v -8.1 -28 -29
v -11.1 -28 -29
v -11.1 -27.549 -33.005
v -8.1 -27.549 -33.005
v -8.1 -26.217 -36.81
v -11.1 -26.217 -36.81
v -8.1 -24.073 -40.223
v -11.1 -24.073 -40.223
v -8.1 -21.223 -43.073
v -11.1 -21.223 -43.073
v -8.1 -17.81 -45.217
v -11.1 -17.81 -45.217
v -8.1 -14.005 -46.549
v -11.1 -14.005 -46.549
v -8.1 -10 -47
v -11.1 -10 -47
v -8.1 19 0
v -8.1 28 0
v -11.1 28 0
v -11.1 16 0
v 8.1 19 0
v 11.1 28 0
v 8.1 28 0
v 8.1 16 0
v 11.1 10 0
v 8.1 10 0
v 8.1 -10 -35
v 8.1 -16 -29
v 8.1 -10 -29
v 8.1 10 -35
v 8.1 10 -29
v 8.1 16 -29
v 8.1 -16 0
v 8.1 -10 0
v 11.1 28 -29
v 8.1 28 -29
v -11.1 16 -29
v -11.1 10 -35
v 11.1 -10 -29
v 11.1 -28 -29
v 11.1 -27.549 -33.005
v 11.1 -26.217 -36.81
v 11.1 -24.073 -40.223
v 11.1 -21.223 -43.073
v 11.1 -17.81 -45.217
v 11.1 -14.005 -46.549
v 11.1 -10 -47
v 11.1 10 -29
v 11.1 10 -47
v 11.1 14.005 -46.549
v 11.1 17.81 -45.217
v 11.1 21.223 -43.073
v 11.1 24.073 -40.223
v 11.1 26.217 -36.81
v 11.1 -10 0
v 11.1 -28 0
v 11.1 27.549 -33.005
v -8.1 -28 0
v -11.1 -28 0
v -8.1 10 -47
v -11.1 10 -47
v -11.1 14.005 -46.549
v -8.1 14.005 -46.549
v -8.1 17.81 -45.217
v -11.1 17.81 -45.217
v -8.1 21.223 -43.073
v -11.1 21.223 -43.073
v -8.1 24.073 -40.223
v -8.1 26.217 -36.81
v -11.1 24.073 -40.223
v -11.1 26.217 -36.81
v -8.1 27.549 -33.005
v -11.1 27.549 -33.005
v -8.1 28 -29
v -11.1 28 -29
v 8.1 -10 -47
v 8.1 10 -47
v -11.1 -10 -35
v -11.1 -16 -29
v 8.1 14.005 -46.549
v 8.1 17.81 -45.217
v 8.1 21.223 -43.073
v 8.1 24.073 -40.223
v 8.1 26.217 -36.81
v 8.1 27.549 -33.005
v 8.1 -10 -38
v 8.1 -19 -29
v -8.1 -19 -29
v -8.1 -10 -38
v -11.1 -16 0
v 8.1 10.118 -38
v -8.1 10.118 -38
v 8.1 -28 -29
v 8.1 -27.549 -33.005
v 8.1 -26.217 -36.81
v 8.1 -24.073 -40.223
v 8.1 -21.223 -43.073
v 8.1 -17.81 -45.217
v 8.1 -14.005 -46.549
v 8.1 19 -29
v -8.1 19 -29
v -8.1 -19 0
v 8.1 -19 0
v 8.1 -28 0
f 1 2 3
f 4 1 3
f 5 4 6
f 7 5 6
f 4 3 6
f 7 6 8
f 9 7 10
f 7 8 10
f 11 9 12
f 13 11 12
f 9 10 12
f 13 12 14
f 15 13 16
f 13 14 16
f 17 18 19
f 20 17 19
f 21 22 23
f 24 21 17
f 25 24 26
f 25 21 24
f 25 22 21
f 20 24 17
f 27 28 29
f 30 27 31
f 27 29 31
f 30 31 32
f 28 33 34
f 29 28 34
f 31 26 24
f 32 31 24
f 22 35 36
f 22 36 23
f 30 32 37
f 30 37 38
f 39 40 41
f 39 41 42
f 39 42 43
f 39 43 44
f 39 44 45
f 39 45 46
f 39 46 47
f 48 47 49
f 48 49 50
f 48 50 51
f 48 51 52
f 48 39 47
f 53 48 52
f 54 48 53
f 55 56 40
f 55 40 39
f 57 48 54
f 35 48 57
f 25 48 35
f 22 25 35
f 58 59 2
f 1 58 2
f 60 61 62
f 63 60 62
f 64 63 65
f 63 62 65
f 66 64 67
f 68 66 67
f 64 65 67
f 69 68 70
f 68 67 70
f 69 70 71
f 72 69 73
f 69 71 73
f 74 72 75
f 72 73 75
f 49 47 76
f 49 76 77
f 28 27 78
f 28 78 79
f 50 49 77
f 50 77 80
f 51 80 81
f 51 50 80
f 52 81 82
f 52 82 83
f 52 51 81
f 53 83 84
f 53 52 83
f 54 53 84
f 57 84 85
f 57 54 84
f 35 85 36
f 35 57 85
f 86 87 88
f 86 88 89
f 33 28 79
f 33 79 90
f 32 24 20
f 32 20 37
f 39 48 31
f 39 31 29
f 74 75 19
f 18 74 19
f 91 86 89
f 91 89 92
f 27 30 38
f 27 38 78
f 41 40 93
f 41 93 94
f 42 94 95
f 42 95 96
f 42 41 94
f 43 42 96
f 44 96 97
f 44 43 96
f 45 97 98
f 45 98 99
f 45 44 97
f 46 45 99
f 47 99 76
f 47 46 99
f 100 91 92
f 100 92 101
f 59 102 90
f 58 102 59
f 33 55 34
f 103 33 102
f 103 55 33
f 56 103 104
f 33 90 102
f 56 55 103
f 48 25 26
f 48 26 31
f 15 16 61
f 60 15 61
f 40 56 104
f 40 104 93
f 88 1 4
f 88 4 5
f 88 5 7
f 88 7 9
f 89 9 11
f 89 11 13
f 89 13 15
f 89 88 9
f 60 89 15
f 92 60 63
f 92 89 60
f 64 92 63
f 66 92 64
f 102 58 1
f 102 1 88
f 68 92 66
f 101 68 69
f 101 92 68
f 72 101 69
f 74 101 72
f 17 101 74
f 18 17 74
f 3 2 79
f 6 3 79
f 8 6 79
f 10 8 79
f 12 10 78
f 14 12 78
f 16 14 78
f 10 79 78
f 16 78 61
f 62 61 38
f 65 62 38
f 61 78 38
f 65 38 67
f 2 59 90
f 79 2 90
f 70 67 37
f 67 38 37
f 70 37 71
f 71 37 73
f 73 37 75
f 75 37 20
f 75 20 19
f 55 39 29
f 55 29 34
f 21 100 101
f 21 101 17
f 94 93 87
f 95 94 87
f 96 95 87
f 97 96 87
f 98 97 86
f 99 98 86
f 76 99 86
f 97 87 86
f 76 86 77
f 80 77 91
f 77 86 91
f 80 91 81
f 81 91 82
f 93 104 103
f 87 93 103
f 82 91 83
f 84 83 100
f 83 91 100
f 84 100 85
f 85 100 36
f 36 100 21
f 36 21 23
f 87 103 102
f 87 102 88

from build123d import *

# Parameters (mm, degrees)
F2_DEPTH = 11.1
F4_DEPTH = 3
F6_DEPTH = 3


# Not quite as in the source:
# - a pattern or mirror of a feature is missing from the dataset's text; its kind, count and spacing are read off the source's solid


with BuildPart() as f2:
    # F1 (on Right) → F2 (new body, symmetric)
    with BuildSketch(Plane.YZ):
        Polygon((-16, 0), (-19, 0), (-19, -29), (-10, -38), (-6, -38), (6, -38), (10.1178772148, -38), (19, -29), (19, 0), (16, 0), (16, -29), (10, -35), (0, -35), (-10, -35), (-16, -29), align=None)
    extrude(amount=F2_DEPTH, both=True)

    # F3 (on face) → F4 (join)
    with BuildSketch(Plane.YZ.offset(11.1)):
        with BuildLine():
            Line((-28, 0), (-28, -29))
            ThreePointArc((-28, -29), (-22.7279220614, -41.7279220614), (-10, -47))
            Line((-10, -47), (10, -47))
            ThreePointArc((10, -47), (22.7279220614, -41.7279220614), (28, -29))
            Line((28, -29), (28, 0))
            Line((28, 0), (19, 0))
            Line((19, 0), (19, -29))
            Line((19, -29), (10.1178772148, -38))
            Line((10.1178772148, -38), (-10, -38))
            Line((-10, -38), (-19, -29))
            Line((-19, -29), (-19, 0))
            Line((-19, 0), (-28, 0))
        make_face()
    f4 = extrude(amount=-F4_DEPTH)

    # F4_copies: F4 across plane
    add(f4.mirror(Plane(origin=(0, 0, 0), x_dir=(0, 0, -1), z_dir=(-1, 0, 0))))

    # F5 (on face) → F6 (join)
    with BuildSketch(Plane.YZ.offset(11.1)):
        Polygon((10, 0), (10, -29), (-10, -29), (-10, 0), (-16, 0), (-16, -29), (-10, -35), (0, -35), (10, -35), (16, -29), (16, 0), align=None)
    extrude(amount=-F6_DEPTH)


solid = f2.part
